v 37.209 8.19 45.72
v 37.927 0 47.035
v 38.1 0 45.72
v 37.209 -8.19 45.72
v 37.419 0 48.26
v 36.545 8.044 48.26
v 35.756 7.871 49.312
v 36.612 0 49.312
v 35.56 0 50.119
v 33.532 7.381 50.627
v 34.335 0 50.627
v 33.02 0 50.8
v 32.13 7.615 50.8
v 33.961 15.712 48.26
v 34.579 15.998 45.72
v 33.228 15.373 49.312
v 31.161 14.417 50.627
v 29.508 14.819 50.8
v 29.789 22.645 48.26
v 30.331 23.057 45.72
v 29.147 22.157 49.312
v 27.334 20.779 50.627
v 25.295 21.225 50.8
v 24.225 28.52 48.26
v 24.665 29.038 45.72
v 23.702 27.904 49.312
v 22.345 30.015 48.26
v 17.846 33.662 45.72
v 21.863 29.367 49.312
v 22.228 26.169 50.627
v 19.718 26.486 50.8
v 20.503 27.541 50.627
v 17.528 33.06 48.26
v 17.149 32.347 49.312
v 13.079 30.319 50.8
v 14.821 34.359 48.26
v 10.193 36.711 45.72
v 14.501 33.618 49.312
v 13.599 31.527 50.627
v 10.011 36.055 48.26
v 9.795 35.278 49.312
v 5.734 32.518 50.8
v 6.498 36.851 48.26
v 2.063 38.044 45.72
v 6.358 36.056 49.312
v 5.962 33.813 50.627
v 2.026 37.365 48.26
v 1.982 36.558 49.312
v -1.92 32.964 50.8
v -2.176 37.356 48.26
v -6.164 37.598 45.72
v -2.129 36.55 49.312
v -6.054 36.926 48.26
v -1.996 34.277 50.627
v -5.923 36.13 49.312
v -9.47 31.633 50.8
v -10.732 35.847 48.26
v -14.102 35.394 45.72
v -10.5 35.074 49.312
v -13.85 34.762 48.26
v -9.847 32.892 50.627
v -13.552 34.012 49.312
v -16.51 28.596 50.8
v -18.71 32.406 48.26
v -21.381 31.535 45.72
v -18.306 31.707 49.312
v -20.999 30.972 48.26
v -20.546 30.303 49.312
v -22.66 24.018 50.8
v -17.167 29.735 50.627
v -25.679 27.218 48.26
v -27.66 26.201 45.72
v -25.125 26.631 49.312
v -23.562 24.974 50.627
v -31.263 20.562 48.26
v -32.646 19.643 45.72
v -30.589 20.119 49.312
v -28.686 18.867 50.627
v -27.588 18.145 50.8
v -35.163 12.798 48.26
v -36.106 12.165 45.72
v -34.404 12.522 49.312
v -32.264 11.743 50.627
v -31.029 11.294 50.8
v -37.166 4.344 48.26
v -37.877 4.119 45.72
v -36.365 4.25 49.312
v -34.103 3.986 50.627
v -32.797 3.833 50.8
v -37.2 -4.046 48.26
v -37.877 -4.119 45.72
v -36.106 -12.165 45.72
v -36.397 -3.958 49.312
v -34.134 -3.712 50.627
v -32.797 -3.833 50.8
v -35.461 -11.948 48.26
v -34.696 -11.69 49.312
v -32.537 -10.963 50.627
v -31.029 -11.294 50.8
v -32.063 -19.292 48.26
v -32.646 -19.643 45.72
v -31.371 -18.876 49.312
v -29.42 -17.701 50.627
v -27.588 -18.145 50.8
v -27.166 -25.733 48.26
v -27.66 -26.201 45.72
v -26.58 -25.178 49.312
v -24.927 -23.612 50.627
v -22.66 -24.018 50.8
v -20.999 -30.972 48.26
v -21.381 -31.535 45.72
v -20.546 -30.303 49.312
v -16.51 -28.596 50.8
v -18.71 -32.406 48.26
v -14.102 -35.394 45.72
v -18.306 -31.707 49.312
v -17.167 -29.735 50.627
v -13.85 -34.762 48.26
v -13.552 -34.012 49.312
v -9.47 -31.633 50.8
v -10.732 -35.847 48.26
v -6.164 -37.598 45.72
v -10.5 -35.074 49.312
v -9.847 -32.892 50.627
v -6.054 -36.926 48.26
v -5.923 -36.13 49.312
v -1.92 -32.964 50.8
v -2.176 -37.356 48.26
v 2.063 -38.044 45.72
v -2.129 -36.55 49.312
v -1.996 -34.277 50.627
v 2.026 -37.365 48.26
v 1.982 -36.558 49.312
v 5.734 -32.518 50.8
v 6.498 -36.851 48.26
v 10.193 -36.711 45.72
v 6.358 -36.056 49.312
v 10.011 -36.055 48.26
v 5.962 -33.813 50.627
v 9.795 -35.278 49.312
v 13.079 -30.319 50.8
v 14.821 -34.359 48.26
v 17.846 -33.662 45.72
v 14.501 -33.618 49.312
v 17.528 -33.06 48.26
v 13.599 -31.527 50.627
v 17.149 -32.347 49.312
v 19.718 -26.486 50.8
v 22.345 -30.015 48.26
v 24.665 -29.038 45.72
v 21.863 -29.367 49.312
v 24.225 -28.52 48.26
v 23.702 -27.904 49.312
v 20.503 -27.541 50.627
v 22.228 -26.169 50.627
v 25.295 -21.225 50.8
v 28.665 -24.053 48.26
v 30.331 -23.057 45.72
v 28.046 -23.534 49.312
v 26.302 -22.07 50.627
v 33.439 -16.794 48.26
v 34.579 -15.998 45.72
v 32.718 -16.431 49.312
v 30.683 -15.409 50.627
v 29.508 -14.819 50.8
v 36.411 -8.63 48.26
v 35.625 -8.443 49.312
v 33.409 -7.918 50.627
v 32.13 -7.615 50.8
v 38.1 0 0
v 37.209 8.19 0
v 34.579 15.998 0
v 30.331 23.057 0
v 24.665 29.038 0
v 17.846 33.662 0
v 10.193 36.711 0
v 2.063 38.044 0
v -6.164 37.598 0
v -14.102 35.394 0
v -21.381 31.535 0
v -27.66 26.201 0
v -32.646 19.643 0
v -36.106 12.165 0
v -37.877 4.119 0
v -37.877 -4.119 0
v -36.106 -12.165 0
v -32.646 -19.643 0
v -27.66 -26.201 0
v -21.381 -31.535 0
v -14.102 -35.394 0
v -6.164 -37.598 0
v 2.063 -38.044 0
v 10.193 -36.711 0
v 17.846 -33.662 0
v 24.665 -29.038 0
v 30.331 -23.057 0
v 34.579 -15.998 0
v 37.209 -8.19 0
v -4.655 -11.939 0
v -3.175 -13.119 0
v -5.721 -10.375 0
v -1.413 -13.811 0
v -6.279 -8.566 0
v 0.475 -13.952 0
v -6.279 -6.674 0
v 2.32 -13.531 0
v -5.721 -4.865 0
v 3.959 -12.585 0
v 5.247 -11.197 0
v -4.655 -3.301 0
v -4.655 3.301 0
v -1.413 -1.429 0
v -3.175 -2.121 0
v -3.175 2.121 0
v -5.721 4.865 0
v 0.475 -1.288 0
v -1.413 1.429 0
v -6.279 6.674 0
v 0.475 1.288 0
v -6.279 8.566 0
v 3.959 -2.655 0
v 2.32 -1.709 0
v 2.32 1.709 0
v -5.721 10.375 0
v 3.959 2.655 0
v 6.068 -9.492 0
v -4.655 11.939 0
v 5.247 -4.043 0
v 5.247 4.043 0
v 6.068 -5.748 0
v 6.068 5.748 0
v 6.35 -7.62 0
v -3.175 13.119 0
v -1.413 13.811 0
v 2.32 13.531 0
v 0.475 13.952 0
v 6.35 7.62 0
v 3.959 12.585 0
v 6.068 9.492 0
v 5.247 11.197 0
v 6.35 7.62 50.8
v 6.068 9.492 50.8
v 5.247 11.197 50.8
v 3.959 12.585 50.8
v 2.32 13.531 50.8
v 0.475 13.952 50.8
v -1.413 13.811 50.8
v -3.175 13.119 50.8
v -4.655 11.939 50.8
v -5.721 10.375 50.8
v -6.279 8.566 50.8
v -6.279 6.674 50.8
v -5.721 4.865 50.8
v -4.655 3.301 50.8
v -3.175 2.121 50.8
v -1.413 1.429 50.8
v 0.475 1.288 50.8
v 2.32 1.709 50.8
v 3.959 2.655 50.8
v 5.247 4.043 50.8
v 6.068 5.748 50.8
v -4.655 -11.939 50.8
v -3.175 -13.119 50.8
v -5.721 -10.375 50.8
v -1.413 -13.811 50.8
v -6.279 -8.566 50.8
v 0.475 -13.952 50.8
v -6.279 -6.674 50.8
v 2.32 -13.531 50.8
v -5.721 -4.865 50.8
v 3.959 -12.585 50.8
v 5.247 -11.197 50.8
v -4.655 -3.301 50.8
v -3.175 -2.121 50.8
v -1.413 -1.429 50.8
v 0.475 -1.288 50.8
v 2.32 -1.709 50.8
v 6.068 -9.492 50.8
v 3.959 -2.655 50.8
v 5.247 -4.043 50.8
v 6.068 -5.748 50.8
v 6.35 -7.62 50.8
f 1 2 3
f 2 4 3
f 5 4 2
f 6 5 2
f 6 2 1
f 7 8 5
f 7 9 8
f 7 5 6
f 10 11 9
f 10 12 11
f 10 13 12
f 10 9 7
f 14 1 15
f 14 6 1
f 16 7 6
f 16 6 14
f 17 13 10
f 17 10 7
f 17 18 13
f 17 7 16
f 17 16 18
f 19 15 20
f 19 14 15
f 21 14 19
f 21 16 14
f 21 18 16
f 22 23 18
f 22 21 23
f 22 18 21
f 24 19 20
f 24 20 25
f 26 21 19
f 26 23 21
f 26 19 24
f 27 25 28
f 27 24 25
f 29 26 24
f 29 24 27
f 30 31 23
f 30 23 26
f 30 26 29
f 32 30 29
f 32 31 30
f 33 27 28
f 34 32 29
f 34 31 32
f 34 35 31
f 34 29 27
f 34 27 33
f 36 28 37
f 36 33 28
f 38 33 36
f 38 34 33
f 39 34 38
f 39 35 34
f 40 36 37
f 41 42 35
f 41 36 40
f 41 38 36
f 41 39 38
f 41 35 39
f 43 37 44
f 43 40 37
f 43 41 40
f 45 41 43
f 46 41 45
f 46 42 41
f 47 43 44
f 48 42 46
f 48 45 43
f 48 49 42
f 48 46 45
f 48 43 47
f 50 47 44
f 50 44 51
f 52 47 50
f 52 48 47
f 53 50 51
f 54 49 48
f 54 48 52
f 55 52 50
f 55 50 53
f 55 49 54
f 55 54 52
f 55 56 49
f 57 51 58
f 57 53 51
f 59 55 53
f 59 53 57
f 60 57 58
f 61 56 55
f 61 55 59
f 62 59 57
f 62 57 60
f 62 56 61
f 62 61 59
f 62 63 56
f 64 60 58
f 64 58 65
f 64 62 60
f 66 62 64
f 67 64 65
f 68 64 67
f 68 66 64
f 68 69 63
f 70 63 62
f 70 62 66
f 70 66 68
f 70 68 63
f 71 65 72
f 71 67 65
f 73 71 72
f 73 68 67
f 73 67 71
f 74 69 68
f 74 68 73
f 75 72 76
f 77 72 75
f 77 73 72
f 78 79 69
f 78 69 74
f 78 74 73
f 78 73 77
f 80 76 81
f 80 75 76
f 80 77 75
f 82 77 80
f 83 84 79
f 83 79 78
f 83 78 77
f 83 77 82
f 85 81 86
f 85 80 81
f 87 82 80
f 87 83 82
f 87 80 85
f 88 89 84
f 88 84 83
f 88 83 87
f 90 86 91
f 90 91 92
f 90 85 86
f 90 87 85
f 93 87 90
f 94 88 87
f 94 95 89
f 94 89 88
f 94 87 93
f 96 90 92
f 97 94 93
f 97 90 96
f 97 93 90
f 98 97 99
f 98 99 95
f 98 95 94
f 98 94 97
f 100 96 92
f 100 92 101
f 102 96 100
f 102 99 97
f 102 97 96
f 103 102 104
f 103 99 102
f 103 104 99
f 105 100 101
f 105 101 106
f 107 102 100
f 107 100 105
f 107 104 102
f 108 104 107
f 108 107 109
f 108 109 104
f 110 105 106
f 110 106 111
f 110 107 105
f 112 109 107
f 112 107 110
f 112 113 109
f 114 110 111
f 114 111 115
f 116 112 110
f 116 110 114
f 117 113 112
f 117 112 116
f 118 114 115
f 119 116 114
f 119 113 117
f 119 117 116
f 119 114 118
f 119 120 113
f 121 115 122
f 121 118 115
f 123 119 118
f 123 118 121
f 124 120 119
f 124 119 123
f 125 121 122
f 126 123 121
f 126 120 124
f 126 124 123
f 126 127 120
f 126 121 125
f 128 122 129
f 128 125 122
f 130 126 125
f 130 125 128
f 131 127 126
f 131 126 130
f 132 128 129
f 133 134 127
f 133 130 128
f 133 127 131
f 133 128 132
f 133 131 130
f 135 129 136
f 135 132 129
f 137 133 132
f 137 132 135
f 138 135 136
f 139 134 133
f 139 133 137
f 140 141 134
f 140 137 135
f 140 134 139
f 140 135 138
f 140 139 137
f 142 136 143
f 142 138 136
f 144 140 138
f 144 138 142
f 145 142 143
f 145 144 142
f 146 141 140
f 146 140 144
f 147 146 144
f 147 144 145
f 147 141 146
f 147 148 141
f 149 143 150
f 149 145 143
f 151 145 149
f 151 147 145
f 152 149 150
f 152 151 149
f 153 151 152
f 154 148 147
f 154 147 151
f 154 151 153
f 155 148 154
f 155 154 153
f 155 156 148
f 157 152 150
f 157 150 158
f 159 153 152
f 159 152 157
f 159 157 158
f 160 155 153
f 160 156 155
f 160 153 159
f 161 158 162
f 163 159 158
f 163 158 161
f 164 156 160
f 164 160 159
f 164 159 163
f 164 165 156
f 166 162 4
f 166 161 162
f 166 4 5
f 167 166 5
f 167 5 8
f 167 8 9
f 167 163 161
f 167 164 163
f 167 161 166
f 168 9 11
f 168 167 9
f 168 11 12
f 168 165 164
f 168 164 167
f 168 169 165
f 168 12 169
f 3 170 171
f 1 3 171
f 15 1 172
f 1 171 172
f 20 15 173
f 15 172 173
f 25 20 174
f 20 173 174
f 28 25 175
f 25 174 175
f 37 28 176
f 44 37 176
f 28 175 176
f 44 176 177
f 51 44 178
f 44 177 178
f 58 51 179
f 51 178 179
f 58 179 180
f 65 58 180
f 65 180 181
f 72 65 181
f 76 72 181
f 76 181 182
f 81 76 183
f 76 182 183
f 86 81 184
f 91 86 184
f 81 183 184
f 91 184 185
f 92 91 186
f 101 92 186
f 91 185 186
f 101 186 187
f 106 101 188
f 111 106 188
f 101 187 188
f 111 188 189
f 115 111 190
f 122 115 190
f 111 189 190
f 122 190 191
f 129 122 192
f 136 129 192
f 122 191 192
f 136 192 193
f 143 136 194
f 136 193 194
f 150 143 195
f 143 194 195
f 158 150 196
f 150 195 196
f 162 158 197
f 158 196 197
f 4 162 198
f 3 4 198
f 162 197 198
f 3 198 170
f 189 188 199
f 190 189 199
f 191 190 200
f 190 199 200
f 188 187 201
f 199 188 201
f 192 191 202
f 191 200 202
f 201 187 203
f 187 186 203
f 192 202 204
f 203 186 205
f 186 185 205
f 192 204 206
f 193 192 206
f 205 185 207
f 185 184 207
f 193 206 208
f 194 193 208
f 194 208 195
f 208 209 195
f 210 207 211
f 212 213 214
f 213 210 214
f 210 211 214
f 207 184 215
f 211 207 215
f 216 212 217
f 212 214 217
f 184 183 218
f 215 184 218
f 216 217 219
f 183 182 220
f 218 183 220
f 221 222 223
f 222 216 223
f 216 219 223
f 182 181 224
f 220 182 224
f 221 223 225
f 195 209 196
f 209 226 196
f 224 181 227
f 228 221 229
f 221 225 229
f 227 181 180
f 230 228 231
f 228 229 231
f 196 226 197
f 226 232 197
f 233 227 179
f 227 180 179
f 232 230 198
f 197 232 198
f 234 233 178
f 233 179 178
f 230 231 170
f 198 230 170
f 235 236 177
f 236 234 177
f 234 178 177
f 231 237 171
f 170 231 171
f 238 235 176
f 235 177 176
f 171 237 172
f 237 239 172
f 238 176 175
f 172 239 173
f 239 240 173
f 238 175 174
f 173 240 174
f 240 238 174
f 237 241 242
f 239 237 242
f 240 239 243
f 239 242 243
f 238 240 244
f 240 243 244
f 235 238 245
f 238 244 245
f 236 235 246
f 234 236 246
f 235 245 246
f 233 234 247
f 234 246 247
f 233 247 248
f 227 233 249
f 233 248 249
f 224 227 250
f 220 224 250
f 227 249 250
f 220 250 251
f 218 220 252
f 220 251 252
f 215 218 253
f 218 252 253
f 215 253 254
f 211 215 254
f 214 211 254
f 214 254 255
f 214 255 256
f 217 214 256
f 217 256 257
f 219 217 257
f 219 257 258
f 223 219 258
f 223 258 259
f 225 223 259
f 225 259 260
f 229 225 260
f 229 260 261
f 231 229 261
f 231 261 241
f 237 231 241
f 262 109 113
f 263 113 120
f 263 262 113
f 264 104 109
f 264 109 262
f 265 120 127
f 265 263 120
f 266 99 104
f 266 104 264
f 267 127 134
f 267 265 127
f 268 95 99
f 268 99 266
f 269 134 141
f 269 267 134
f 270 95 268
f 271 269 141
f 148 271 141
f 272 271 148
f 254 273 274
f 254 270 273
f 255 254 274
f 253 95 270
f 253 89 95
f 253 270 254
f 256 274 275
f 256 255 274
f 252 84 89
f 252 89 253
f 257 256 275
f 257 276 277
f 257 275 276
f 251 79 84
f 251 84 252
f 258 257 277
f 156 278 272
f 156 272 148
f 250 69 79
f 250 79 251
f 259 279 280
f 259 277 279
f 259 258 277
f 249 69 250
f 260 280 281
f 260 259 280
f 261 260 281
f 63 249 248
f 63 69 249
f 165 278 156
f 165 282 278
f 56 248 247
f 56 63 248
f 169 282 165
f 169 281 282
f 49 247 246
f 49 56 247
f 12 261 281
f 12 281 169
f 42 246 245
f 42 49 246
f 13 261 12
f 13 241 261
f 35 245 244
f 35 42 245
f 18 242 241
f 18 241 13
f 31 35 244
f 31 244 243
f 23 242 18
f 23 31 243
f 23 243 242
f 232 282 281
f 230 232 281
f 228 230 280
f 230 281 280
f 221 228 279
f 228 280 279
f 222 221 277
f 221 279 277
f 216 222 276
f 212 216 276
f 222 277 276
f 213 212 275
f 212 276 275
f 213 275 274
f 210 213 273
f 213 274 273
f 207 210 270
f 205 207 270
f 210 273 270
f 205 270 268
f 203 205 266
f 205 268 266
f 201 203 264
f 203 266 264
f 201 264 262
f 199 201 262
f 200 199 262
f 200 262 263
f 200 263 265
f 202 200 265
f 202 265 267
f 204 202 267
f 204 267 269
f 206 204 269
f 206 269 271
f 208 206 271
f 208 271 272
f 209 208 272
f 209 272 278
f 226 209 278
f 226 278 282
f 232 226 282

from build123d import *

# Parameters (mm, degrees)
F0_R     = 38.1
F1_DEPTH = 50.8
F2_R     = 6.35
F3_DEPTH = 70.612
F4_R     = 5.08


with BuildPart() as f1:
    # F0 (on Top) → F1 (new body)
    with BuildSketch(Plane.XY):
        Circle(F0_R)
    extrude(amount=F1_DEPTH)

    # F2 (on face) → F3 (cut)
    with BuildSketch(Plane.XY.offset(50.8)):
        with Locations((0, 7.62)):
            Circle(F2_R)
        with Locations((0, -7.62)):
            Circle(F2_R)
    extrude(amount=-F3_DEPTH, mode=Mode.SUBTRACT)

    # F4
    f4_edges = [f1.edges().sort_by_distance(p)[0] for p in [
        (-38.1, 0, 50.8),
    ]]
    fillet(f4_edges, radius=F4_R)


solid = f1.part
